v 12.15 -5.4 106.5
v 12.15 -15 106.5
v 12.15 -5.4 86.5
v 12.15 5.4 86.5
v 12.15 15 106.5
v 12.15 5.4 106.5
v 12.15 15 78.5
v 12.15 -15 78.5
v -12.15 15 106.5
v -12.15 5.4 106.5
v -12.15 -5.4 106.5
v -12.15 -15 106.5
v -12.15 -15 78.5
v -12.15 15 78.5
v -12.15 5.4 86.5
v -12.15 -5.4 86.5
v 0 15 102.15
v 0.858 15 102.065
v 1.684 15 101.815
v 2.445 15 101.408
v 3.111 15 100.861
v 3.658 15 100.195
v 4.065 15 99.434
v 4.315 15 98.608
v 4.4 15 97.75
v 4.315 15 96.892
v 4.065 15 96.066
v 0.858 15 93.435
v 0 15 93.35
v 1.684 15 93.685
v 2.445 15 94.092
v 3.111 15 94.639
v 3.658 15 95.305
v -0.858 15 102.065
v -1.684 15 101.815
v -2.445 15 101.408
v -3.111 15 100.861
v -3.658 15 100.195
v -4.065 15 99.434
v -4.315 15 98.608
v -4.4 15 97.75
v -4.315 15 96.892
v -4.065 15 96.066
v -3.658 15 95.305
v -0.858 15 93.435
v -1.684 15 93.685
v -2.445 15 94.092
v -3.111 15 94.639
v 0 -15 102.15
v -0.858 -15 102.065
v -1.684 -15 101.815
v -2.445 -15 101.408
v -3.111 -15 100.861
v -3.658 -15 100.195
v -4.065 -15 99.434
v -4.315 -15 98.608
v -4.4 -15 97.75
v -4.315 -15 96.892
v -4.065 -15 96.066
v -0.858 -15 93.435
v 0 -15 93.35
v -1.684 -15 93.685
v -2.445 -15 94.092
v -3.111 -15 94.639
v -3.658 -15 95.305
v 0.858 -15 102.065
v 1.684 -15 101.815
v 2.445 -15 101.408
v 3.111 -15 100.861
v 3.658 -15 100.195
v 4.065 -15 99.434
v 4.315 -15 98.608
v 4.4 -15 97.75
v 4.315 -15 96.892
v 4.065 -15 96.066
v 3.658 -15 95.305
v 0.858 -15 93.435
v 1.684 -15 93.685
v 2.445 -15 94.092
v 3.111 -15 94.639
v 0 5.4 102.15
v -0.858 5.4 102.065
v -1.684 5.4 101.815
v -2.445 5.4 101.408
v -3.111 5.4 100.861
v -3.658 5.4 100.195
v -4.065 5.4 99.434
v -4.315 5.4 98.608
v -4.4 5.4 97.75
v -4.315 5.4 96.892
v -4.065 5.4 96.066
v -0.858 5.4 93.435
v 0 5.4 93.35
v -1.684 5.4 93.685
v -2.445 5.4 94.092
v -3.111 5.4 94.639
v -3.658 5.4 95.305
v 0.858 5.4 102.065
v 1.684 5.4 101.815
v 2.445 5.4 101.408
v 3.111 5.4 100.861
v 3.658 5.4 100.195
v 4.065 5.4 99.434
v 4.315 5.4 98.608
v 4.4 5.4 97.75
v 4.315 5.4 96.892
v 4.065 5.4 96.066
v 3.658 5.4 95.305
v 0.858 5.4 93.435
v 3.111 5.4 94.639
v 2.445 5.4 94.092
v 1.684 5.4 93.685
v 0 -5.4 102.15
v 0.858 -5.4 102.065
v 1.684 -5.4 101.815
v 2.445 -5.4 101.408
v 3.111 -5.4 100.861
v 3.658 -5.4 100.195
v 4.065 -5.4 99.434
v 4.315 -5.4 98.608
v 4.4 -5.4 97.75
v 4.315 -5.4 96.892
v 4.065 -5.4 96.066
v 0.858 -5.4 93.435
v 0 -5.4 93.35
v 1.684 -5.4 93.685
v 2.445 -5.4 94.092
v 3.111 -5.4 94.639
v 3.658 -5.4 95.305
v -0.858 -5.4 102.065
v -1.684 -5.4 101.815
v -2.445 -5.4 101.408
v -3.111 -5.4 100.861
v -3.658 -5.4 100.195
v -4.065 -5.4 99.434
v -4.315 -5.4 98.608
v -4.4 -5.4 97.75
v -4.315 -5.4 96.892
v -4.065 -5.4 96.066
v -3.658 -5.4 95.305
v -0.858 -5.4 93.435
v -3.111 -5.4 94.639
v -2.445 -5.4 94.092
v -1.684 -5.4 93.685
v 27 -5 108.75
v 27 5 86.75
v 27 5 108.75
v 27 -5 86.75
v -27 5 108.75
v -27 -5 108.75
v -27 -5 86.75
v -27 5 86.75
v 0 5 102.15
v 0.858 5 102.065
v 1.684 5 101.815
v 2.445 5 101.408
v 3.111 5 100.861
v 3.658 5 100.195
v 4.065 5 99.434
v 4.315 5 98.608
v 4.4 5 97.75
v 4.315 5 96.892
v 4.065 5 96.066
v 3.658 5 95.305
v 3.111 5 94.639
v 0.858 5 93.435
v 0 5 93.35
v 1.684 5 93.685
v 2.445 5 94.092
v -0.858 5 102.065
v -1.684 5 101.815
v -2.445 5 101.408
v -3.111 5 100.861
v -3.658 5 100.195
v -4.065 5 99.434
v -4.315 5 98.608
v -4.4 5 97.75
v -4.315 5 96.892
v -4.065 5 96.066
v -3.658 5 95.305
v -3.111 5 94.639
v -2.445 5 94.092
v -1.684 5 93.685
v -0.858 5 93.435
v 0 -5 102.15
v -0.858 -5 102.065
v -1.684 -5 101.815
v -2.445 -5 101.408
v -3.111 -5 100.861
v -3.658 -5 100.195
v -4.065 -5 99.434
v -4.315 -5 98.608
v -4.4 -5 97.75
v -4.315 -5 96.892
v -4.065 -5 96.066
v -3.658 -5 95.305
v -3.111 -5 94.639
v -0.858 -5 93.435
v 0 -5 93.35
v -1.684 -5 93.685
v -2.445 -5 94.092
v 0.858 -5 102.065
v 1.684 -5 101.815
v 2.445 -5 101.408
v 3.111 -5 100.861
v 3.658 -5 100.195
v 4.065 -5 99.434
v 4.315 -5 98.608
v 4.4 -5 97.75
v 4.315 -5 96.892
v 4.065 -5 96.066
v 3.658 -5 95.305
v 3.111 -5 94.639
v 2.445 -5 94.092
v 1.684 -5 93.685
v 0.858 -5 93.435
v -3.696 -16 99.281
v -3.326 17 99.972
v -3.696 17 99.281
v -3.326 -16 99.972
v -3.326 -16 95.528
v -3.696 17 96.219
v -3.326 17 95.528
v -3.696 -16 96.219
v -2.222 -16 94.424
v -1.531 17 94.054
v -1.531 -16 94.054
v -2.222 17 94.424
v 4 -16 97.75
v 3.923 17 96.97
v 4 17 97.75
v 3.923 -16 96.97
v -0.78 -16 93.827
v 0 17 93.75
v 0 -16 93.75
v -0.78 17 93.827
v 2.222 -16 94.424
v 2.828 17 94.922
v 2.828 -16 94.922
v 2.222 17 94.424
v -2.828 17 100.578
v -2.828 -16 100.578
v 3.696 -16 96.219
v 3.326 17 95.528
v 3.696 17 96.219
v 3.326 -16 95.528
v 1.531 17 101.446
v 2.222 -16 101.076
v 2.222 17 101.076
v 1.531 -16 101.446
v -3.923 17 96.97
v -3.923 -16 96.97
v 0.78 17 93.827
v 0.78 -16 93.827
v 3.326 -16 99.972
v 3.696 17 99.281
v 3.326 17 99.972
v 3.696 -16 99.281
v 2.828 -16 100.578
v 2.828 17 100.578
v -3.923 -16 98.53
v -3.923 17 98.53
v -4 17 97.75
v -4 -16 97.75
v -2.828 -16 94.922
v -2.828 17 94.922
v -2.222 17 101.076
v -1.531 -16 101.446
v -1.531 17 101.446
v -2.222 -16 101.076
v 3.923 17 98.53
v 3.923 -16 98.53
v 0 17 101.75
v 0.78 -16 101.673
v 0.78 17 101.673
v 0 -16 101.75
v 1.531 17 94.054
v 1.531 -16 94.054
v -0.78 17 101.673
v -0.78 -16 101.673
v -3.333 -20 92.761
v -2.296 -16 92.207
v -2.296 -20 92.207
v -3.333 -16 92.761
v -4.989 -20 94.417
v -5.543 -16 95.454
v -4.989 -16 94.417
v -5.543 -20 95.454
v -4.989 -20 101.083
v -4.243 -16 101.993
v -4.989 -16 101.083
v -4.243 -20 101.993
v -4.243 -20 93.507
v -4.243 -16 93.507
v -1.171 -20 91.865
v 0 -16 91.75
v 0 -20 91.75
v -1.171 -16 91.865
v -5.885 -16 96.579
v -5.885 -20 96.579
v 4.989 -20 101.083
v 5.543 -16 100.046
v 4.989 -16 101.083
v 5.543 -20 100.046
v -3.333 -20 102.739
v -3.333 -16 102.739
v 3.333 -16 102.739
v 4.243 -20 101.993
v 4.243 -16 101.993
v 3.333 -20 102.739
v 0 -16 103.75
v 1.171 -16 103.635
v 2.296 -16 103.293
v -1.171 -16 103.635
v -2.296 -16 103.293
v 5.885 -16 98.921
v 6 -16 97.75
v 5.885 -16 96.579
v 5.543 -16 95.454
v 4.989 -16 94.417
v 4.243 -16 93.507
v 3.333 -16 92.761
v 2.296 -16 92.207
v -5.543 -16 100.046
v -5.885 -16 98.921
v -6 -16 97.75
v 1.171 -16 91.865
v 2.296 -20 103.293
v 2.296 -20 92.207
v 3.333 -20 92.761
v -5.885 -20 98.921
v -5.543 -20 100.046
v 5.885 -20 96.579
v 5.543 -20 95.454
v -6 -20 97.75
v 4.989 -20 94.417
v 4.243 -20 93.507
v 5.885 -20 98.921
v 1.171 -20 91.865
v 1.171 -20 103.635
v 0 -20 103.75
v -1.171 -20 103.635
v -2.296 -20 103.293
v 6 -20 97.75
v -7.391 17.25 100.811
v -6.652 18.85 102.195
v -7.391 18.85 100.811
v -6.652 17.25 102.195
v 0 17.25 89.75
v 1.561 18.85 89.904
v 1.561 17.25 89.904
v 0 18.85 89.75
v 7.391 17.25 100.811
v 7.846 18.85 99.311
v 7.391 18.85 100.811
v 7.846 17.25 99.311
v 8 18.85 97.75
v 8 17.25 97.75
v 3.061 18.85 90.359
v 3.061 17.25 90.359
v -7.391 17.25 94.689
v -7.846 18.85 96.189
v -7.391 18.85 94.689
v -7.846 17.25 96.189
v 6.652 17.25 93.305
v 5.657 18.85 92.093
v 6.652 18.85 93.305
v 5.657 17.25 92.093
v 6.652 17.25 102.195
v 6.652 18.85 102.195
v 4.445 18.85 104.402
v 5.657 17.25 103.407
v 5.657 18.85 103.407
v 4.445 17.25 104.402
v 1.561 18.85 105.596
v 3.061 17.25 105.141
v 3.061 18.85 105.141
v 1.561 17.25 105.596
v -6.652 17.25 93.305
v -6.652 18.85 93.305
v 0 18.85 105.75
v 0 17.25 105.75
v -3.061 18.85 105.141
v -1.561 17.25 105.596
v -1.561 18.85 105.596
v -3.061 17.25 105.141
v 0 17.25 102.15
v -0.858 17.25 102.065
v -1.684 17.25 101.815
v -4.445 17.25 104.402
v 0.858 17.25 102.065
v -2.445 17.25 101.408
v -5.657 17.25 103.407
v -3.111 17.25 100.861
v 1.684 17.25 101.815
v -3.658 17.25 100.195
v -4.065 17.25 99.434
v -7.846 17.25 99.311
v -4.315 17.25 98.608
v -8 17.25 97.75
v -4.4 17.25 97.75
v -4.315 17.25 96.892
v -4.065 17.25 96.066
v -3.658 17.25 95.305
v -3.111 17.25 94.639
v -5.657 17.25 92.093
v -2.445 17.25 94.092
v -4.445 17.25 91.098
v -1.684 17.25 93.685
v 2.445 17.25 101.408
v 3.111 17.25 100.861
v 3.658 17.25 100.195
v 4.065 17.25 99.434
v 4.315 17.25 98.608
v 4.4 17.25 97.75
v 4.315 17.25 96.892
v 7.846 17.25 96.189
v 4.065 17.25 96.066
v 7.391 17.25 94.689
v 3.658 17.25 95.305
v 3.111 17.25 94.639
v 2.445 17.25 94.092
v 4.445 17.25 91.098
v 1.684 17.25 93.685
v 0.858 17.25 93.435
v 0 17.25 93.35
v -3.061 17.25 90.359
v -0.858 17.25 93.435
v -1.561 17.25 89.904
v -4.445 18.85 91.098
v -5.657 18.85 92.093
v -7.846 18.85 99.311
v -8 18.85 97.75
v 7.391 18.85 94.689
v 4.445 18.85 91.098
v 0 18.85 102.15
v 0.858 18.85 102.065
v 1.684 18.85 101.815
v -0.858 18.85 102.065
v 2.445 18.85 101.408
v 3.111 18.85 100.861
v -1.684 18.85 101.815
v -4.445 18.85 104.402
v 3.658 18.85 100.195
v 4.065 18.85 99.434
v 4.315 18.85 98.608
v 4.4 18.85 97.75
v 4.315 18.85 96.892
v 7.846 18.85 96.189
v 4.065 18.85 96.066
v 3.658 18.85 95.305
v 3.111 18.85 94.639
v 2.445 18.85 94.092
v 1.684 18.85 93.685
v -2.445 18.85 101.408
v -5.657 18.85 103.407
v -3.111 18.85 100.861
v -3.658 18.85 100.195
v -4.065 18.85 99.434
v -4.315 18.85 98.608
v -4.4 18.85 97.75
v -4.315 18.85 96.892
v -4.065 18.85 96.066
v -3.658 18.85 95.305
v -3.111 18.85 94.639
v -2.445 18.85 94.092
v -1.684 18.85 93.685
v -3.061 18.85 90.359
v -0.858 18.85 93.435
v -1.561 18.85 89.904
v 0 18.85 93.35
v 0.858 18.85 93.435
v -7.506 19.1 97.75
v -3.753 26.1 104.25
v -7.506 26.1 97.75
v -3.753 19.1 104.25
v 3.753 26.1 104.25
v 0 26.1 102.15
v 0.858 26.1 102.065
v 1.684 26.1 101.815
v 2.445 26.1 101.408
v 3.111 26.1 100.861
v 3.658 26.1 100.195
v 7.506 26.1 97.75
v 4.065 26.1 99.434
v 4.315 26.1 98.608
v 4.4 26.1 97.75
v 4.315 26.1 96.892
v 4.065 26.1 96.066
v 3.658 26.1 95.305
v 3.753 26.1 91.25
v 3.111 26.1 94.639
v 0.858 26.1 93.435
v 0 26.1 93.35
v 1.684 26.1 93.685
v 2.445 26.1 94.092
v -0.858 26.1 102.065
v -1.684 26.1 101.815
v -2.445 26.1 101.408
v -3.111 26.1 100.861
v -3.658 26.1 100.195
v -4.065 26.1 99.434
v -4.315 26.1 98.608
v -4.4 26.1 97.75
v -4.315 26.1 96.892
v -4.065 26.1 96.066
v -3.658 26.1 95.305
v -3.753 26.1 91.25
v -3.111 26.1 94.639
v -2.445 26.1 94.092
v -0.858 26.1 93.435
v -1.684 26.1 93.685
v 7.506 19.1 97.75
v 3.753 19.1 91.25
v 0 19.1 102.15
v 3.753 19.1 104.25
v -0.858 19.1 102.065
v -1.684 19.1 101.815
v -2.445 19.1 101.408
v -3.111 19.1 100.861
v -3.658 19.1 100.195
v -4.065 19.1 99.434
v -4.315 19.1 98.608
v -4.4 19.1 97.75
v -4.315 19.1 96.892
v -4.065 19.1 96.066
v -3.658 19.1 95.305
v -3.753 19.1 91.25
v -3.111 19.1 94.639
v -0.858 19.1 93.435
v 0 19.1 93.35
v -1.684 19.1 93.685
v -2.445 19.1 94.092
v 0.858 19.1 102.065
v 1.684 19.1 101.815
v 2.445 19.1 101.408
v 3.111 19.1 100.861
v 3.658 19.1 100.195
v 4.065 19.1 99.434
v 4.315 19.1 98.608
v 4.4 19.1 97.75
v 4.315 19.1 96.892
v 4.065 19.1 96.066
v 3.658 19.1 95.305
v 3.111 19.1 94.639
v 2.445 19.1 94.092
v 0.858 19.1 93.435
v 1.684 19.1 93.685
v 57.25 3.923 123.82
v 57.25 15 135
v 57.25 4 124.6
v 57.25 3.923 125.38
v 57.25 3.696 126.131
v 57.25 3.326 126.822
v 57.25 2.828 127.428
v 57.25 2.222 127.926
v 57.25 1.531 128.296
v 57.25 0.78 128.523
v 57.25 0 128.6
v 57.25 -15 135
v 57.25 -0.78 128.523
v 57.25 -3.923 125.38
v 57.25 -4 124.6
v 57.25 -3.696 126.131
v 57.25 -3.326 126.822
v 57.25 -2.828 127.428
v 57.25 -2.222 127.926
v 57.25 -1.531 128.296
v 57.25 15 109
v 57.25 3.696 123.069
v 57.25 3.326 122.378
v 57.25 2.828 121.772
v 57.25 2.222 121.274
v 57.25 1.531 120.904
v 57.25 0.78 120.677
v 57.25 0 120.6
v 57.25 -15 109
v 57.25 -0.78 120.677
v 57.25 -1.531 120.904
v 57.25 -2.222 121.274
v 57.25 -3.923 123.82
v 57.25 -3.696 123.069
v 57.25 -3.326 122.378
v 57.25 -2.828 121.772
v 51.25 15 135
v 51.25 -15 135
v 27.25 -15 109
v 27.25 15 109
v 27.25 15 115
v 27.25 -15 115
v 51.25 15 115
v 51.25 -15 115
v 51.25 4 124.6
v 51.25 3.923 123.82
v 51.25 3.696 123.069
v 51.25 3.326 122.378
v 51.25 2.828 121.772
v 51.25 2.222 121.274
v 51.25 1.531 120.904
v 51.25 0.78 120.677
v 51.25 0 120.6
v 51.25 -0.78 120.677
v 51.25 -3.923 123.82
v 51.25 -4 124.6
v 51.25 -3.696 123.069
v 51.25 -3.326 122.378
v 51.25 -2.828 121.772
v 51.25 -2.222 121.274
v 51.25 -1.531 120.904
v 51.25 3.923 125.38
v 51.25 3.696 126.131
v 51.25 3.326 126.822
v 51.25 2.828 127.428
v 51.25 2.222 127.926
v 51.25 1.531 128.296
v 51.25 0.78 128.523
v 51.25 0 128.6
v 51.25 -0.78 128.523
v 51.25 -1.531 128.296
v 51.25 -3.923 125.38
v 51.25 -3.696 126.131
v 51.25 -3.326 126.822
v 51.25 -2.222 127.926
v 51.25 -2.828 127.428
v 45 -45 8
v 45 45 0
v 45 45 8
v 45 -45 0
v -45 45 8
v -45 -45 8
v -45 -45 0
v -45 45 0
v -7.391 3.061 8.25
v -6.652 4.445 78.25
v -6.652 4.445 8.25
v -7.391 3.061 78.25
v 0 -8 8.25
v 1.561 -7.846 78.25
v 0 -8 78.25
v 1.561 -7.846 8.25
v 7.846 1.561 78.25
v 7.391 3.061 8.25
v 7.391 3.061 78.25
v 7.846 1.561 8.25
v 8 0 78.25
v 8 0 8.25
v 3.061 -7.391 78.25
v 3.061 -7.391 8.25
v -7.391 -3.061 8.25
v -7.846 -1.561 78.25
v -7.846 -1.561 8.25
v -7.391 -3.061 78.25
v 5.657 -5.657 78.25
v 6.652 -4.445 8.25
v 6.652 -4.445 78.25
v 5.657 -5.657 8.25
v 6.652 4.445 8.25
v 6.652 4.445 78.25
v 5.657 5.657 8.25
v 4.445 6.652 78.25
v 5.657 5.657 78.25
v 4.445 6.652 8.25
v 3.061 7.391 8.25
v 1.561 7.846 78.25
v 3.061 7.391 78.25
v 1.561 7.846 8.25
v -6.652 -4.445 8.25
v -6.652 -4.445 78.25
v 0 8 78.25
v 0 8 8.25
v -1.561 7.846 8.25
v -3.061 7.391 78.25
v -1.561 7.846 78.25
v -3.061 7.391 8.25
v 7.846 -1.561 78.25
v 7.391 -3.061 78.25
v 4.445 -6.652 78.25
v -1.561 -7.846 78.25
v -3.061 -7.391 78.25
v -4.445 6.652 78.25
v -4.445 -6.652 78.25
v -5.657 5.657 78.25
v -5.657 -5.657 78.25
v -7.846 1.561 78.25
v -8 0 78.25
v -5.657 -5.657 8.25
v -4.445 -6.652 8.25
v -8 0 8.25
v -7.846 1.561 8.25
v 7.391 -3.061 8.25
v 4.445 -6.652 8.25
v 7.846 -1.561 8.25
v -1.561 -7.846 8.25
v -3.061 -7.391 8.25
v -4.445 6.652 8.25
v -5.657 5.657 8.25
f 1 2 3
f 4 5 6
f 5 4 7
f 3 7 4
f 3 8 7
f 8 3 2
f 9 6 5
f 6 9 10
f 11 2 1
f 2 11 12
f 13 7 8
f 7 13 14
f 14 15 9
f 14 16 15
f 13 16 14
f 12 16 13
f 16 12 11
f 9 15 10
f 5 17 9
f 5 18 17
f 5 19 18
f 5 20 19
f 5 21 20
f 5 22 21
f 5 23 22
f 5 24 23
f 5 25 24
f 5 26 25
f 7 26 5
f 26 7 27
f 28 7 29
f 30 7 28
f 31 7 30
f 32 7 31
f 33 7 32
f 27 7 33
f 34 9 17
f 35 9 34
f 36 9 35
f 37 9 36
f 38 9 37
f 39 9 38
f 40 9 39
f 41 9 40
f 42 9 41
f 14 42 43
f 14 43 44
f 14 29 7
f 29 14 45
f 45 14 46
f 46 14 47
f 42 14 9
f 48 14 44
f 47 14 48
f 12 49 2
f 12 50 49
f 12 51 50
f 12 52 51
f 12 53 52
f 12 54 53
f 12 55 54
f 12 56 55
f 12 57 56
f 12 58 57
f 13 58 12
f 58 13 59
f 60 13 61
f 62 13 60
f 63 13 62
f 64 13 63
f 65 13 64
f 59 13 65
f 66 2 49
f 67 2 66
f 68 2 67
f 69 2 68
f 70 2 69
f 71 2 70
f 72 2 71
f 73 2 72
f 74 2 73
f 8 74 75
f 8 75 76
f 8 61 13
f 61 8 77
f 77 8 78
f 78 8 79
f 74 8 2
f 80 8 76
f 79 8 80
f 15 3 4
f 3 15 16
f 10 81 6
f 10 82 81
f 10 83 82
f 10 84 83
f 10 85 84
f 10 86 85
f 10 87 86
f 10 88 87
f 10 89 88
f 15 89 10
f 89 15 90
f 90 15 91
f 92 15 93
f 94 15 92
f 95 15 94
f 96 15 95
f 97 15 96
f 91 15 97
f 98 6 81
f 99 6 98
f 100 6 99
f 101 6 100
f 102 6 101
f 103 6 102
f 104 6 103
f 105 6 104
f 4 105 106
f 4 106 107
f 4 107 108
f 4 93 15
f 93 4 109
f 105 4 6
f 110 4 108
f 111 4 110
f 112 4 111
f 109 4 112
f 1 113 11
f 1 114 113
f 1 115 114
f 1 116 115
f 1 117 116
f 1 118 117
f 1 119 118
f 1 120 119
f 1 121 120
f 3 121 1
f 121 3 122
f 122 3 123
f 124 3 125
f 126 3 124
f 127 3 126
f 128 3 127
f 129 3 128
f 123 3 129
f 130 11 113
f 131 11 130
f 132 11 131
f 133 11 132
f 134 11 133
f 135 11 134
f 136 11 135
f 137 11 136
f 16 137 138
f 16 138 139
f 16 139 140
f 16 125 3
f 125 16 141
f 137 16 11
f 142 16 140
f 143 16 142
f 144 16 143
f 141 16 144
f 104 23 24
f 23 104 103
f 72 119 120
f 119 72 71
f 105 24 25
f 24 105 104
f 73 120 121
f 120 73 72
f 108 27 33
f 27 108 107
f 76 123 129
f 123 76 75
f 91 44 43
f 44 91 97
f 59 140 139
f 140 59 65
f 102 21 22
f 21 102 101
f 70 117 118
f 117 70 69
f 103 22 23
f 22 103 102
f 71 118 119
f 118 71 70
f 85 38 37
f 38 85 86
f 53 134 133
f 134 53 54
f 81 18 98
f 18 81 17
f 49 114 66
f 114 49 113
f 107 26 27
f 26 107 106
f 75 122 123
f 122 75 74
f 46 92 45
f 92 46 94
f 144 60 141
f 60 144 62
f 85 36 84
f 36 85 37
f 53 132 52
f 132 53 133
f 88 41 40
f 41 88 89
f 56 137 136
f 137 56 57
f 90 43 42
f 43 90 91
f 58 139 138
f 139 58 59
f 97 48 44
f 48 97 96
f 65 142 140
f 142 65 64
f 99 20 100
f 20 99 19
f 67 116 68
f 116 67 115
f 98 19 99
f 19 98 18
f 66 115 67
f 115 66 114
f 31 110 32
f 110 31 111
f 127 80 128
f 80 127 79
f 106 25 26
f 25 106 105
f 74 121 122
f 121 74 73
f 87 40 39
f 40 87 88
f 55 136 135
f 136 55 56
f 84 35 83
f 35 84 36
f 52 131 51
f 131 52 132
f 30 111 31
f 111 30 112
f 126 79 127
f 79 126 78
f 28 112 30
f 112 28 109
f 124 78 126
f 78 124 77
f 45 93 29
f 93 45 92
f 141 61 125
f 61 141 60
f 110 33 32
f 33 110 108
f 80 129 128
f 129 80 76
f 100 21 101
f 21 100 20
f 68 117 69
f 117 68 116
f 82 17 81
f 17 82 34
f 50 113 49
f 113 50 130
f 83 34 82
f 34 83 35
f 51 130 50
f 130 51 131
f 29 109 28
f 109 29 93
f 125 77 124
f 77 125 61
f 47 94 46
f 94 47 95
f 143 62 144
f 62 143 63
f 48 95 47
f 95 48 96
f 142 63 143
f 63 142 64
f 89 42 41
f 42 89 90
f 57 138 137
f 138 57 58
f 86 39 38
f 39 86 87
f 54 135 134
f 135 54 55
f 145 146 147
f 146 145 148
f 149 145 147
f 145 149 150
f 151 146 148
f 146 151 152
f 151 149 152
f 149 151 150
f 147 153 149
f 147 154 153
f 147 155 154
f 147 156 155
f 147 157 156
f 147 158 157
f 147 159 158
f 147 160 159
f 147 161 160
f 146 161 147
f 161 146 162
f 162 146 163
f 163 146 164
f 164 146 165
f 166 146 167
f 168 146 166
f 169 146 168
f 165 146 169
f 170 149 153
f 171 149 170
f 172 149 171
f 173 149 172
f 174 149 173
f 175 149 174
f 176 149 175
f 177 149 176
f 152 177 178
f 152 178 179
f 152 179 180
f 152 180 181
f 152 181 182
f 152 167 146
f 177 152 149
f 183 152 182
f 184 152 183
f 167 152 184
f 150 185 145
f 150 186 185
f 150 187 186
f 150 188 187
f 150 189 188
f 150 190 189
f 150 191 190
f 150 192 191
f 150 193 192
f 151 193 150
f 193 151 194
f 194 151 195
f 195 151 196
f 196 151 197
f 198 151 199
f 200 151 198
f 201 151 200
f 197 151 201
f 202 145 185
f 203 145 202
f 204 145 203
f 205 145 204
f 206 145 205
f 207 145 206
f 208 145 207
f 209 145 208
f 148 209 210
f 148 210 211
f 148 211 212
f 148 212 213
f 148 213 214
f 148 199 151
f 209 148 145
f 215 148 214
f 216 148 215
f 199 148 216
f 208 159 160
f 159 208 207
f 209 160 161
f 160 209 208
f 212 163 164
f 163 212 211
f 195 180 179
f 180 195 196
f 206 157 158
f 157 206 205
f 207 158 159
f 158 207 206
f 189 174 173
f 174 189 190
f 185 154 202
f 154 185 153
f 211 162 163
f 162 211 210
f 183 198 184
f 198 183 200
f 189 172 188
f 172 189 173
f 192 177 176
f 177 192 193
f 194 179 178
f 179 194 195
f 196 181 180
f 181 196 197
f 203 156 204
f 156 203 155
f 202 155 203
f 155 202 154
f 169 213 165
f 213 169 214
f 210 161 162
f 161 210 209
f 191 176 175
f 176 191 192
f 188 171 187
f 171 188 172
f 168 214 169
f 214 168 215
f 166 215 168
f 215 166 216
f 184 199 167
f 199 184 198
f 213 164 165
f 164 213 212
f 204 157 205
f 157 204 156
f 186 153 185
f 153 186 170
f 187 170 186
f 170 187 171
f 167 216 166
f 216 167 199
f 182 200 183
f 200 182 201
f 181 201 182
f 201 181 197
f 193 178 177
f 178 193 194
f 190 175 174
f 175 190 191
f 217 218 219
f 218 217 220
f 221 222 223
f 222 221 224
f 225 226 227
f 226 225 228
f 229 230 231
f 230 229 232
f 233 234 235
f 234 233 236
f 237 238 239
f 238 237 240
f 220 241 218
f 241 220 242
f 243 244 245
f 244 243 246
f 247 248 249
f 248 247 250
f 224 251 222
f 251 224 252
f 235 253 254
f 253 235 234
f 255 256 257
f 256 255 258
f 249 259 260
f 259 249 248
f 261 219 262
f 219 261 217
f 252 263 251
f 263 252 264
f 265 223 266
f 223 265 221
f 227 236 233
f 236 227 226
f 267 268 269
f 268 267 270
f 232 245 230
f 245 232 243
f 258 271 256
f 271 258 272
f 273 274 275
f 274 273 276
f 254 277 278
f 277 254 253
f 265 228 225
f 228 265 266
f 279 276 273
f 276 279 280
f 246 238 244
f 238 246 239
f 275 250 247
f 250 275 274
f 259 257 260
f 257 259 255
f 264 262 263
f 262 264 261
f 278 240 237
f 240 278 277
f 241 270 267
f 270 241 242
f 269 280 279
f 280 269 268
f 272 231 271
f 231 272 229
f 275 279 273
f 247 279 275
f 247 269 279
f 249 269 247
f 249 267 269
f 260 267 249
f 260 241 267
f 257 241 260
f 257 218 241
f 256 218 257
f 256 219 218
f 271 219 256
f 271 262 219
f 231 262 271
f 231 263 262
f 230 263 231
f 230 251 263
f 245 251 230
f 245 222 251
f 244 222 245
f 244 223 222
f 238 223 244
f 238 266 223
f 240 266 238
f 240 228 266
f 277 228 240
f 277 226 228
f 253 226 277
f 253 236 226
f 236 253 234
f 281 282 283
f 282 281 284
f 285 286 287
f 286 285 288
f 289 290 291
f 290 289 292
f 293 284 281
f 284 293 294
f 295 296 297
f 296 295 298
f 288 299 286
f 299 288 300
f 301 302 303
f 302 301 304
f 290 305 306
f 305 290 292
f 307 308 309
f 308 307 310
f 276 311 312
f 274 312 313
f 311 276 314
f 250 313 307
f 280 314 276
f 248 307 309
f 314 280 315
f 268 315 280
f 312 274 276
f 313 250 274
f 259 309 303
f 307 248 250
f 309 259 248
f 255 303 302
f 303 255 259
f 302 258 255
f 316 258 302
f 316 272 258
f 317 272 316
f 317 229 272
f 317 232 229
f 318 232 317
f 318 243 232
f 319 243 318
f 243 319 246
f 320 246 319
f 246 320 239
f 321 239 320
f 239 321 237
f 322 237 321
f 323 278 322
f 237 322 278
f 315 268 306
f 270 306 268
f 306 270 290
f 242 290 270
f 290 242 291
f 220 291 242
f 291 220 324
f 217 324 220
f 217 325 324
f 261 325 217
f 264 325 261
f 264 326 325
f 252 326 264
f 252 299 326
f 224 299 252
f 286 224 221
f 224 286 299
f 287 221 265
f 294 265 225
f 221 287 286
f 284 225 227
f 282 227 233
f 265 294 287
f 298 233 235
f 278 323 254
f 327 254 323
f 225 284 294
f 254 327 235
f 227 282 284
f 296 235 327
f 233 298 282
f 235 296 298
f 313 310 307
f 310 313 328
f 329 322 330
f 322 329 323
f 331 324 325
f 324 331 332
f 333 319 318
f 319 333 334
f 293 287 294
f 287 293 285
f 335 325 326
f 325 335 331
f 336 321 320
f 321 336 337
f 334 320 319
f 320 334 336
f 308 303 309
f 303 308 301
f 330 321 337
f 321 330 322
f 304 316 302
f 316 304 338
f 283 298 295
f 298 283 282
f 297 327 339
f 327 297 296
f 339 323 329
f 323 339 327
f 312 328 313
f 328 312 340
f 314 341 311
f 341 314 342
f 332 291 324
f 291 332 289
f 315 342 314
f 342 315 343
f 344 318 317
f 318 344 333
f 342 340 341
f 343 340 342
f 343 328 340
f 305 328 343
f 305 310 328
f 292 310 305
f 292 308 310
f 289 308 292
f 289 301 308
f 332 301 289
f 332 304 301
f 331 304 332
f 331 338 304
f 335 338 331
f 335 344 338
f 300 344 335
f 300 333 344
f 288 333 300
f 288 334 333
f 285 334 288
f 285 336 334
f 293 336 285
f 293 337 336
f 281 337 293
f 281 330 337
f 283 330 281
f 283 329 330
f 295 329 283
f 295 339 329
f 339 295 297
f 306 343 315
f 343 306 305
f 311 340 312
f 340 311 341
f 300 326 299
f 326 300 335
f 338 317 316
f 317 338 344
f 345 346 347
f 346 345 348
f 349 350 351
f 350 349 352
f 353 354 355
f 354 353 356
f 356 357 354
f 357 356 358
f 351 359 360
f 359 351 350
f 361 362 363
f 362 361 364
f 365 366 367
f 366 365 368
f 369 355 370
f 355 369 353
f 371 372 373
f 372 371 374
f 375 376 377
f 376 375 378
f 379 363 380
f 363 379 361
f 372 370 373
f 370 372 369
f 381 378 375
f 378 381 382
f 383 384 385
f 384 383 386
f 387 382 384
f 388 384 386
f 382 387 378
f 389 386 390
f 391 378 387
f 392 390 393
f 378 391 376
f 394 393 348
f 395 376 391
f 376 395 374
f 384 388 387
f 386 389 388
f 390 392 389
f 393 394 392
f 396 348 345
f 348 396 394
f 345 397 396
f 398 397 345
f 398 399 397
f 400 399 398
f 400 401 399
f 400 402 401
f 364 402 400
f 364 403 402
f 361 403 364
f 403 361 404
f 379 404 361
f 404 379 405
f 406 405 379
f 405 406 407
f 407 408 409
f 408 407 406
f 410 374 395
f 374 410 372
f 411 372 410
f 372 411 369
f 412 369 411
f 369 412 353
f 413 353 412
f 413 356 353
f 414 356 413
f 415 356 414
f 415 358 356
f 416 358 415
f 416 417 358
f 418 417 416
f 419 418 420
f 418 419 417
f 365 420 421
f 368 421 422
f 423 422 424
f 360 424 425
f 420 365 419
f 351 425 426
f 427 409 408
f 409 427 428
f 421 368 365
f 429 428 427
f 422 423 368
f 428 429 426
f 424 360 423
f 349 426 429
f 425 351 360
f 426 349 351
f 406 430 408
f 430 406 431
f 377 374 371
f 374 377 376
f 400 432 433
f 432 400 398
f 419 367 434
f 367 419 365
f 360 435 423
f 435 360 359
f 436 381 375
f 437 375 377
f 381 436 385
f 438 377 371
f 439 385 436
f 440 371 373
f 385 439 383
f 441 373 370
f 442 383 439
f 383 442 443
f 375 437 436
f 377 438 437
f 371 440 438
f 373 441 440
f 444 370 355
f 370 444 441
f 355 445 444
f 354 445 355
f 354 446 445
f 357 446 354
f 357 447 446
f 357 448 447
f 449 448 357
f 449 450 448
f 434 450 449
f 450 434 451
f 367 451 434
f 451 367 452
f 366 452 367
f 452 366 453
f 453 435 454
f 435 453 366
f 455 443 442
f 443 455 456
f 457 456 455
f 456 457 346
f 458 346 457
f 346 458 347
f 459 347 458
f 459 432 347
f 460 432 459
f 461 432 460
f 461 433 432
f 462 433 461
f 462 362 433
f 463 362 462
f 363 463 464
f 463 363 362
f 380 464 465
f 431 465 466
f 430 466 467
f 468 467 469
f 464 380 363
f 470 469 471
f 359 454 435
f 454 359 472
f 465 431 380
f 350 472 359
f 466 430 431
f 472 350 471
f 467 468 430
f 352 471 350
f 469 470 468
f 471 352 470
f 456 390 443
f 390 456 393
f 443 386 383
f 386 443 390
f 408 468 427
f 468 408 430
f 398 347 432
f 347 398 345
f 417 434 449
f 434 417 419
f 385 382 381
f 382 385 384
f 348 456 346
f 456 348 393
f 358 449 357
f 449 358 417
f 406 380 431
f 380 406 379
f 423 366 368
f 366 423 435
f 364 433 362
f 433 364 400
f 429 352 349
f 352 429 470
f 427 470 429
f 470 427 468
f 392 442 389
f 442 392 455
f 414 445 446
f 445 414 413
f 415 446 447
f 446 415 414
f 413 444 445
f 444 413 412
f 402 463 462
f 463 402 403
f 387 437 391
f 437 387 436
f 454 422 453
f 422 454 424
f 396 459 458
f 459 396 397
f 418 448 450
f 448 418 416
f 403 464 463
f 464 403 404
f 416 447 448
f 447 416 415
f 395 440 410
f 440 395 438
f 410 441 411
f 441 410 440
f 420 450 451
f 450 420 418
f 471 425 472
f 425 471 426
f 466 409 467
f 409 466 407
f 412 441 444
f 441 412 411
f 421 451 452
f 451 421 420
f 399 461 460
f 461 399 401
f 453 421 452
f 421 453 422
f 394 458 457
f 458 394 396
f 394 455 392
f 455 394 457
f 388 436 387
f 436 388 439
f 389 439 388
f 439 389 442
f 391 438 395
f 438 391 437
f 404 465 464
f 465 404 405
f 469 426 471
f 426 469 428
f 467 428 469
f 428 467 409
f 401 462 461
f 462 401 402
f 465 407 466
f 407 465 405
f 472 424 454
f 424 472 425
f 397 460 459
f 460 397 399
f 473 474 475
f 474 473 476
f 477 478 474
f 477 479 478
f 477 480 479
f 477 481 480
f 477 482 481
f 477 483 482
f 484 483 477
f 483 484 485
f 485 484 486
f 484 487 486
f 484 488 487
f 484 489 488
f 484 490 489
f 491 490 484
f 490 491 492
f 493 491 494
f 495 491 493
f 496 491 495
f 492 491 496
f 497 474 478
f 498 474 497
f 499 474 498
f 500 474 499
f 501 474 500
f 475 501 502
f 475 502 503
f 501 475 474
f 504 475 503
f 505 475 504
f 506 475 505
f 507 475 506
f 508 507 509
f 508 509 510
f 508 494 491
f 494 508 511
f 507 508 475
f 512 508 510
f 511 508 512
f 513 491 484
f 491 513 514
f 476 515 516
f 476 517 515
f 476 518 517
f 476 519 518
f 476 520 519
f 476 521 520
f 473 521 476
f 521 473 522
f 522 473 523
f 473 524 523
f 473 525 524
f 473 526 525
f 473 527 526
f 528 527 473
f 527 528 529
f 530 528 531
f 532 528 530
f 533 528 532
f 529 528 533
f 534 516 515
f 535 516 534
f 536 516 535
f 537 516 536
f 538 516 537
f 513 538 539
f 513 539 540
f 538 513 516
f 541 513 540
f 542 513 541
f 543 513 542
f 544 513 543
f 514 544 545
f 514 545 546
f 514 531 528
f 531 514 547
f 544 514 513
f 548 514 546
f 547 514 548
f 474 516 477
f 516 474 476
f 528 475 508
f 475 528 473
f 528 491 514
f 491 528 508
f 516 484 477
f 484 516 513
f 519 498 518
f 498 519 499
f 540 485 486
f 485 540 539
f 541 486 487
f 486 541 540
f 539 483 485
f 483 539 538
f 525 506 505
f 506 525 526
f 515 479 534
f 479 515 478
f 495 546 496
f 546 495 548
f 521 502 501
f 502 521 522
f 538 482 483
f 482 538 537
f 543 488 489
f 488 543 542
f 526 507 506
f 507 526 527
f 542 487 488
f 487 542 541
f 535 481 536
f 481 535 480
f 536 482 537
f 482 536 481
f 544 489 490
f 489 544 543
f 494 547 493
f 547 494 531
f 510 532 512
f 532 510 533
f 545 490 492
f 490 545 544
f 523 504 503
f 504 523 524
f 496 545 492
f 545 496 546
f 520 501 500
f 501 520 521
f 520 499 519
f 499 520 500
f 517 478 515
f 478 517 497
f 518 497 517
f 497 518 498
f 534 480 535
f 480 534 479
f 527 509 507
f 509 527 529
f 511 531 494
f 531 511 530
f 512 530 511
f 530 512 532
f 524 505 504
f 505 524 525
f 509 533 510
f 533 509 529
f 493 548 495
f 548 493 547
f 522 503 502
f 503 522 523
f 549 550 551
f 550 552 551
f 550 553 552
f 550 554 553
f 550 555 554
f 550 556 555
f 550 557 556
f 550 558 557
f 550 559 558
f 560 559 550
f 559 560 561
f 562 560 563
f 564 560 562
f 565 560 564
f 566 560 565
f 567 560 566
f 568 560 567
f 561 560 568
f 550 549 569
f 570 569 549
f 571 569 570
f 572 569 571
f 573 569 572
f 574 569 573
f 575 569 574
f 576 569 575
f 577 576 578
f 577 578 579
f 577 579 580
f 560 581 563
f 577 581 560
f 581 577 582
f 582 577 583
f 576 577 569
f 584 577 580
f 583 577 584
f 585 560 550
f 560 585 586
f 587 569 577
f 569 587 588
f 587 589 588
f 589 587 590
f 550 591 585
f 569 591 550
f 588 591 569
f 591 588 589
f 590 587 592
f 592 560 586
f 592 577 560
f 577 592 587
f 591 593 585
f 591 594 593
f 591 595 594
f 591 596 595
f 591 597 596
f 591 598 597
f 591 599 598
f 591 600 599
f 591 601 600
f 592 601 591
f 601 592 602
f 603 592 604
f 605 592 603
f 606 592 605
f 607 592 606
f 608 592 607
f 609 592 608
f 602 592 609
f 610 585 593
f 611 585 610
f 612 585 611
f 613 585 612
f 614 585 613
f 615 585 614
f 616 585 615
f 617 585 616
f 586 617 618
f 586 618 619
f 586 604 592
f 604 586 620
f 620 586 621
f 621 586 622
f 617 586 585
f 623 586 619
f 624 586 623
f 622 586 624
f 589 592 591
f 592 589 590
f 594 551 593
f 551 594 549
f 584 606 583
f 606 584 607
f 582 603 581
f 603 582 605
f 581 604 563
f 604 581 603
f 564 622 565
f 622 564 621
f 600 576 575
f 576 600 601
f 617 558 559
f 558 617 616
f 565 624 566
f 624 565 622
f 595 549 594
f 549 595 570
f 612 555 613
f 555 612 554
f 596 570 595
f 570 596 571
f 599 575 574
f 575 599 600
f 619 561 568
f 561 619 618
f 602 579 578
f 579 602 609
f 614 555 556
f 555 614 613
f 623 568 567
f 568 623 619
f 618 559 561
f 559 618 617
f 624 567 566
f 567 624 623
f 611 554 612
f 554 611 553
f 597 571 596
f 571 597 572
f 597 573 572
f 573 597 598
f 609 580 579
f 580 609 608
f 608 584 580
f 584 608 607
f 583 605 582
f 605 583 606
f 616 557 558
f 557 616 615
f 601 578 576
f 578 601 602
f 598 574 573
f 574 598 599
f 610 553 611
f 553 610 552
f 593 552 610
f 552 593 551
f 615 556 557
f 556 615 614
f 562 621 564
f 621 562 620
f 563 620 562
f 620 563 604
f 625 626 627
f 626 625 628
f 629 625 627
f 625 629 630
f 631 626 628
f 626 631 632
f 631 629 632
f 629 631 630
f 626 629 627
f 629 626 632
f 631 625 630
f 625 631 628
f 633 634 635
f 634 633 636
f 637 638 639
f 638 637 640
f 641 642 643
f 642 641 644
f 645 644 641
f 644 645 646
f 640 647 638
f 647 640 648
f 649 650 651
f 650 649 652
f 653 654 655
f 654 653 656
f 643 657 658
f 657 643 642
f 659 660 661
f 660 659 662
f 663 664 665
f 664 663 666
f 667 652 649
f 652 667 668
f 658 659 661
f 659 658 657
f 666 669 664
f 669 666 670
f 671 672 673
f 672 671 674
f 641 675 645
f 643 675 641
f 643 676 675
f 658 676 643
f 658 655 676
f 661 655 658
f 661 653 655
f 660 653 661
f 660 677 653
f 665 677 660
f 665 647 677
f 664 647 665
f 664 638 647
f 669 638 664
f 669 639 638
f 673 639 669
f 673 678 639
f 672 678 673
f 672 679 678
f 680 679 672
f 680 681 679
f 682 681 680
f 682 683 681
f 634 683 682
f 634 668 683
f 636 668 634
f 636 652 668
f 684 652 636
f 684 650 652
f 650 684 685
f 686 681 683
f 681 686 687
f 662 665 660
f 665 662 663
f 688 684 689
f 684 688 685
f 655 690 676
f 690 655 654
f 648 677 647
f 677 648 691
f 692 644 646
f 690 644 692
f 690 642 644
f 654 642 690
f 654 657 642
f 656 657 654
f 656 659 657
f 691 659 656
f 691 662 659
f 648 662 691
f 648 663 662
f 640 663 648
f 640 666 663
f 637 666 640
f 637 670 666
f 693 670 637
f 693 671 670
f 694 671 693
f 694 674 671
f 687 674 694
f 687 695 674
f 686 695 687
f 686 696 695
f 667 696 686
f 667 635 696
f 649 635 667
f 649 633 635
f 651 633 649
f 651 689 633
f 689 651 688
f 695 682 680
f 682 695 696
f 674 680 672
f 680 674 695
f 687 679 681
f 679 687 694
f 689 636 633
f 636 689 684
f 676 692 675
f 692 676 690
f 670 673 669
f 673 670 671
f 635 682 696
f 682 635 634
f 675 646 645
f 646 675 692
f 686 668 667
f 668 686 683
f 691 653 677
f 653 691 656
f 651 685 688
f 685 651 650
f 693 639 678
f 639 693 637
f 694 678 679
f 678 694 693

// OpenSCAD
$fn = 32;

// ------------------------------------------------------------------------
// Lamp arm: column d16 x 70 mm, arm 54 mm
// Every part is its own module, assembly() places every instance.
// ------------------------------------------------------------------------

// --- part 1 ---
module lamp_base() {
  difference() {
    translate([-45, -45, 0]) cube([90, 90, 8]);
  }
}

// --- part 2 ---
module lamp_column() {
  cylinder(h = 70, d = 16);
}

// --- part 3 ---
module head_fork() {
  difference() {
    translate([-12.15, -15, 0]) cube([24.3, 30, 28]);
    translate([-13.15, -5.4, 8]) cube([26.3, 10.8, 21]);
    translate([0, 0, 19.25]) rotate([90, 0, 0]) cylinder(h = 32, d = 8.8, center = true);
  }
}

// --- part 4 ---
module lamp_arm() {
  difference() {
    translate([-27, -5, 0]) cube([54, 10, 22]);
    translate([0, 0, 11]) rotate([90, 0, 0]) cylinder(h = 12, d = 8.8, center = true);
  }
}

// --- part 5 ---
module arm_pin() {
  rotate([0, 90, 0]) cylinder(h = 34, d = 8, center = true);
  translate([-20, 0, 0]) rotate([0, 90, 0]) cylinder(h = 4, d = 12);
}

// --- part 6 ---
module arm_washer() {
  difference() {
      translate([0, 0, 0]) cylinder(h = 1.6, d = 16);
      translate([0, 0, -1]) cylinder(h = 3.6, d = 8.8);
    }
}

// --- part 7 ---
module arm_nut() {
  difference() {
    linear_extrude(height = 7) polygon(points = [[7.506, 0], [3.753, 6.5], [-3.753, 6.5], [-7.506, 0], [-3.753, -6.5], [3.753, -6.5]]);
    translate([0, 0, -1]) cylinder(h = 9, d = 8.8);
  }
}

// --- part 8 ---
module shade_bracket() {
  difference() {
    translate([-15, -15, 0]) cube([30, 30, 26]);
    translate([-16, -16, 6]) cube([25, 32, 21]);
    translate([12, 0, 15.6]) rotate([0, 90, 0]) cylinder(h = 8, d = 8, center = true);
  }
}

// --- assembly ---
module assembly() {
  color([0.80, 0.24, 0.20]) translate([0, 0, 0]) rotate([0, 0, 0]) lamp_base();
  color([0.20, 0.45, 0.75]) translate([0, 0, 8.25]) rotate([0, 0, 0]) lamp_column();
  color([0.25, 0.62, 0.32]) translate([0, 0, 78.5]) rotate([0, 0, 0]) head_fork();
  color([0.92, 0.70, 0.18]) translate([0, 0, 86.75]) rotate([0, 0, 0]) lamp_arm();
  color([0.58, 0.35, 0.70]) translate([0, 0, 97.75]) rotate([0, 0, 90]) arm_pin();
  color([0.16, 0.66, 0.66]) translate([0, 18.85, 97.75]) rotate([90, 0, 0]) arm_washer();
  color([0.85, 0.48, 0.18]) translate([0, 26.1, 97.75]) rotate([90, 0, 0]) arm_nut();
  color([0.55, 0.60, 0.65]) translate([42.25, 0, 109]) rotate([0, 0, 0]) shade_bracket();
}

assembly();
